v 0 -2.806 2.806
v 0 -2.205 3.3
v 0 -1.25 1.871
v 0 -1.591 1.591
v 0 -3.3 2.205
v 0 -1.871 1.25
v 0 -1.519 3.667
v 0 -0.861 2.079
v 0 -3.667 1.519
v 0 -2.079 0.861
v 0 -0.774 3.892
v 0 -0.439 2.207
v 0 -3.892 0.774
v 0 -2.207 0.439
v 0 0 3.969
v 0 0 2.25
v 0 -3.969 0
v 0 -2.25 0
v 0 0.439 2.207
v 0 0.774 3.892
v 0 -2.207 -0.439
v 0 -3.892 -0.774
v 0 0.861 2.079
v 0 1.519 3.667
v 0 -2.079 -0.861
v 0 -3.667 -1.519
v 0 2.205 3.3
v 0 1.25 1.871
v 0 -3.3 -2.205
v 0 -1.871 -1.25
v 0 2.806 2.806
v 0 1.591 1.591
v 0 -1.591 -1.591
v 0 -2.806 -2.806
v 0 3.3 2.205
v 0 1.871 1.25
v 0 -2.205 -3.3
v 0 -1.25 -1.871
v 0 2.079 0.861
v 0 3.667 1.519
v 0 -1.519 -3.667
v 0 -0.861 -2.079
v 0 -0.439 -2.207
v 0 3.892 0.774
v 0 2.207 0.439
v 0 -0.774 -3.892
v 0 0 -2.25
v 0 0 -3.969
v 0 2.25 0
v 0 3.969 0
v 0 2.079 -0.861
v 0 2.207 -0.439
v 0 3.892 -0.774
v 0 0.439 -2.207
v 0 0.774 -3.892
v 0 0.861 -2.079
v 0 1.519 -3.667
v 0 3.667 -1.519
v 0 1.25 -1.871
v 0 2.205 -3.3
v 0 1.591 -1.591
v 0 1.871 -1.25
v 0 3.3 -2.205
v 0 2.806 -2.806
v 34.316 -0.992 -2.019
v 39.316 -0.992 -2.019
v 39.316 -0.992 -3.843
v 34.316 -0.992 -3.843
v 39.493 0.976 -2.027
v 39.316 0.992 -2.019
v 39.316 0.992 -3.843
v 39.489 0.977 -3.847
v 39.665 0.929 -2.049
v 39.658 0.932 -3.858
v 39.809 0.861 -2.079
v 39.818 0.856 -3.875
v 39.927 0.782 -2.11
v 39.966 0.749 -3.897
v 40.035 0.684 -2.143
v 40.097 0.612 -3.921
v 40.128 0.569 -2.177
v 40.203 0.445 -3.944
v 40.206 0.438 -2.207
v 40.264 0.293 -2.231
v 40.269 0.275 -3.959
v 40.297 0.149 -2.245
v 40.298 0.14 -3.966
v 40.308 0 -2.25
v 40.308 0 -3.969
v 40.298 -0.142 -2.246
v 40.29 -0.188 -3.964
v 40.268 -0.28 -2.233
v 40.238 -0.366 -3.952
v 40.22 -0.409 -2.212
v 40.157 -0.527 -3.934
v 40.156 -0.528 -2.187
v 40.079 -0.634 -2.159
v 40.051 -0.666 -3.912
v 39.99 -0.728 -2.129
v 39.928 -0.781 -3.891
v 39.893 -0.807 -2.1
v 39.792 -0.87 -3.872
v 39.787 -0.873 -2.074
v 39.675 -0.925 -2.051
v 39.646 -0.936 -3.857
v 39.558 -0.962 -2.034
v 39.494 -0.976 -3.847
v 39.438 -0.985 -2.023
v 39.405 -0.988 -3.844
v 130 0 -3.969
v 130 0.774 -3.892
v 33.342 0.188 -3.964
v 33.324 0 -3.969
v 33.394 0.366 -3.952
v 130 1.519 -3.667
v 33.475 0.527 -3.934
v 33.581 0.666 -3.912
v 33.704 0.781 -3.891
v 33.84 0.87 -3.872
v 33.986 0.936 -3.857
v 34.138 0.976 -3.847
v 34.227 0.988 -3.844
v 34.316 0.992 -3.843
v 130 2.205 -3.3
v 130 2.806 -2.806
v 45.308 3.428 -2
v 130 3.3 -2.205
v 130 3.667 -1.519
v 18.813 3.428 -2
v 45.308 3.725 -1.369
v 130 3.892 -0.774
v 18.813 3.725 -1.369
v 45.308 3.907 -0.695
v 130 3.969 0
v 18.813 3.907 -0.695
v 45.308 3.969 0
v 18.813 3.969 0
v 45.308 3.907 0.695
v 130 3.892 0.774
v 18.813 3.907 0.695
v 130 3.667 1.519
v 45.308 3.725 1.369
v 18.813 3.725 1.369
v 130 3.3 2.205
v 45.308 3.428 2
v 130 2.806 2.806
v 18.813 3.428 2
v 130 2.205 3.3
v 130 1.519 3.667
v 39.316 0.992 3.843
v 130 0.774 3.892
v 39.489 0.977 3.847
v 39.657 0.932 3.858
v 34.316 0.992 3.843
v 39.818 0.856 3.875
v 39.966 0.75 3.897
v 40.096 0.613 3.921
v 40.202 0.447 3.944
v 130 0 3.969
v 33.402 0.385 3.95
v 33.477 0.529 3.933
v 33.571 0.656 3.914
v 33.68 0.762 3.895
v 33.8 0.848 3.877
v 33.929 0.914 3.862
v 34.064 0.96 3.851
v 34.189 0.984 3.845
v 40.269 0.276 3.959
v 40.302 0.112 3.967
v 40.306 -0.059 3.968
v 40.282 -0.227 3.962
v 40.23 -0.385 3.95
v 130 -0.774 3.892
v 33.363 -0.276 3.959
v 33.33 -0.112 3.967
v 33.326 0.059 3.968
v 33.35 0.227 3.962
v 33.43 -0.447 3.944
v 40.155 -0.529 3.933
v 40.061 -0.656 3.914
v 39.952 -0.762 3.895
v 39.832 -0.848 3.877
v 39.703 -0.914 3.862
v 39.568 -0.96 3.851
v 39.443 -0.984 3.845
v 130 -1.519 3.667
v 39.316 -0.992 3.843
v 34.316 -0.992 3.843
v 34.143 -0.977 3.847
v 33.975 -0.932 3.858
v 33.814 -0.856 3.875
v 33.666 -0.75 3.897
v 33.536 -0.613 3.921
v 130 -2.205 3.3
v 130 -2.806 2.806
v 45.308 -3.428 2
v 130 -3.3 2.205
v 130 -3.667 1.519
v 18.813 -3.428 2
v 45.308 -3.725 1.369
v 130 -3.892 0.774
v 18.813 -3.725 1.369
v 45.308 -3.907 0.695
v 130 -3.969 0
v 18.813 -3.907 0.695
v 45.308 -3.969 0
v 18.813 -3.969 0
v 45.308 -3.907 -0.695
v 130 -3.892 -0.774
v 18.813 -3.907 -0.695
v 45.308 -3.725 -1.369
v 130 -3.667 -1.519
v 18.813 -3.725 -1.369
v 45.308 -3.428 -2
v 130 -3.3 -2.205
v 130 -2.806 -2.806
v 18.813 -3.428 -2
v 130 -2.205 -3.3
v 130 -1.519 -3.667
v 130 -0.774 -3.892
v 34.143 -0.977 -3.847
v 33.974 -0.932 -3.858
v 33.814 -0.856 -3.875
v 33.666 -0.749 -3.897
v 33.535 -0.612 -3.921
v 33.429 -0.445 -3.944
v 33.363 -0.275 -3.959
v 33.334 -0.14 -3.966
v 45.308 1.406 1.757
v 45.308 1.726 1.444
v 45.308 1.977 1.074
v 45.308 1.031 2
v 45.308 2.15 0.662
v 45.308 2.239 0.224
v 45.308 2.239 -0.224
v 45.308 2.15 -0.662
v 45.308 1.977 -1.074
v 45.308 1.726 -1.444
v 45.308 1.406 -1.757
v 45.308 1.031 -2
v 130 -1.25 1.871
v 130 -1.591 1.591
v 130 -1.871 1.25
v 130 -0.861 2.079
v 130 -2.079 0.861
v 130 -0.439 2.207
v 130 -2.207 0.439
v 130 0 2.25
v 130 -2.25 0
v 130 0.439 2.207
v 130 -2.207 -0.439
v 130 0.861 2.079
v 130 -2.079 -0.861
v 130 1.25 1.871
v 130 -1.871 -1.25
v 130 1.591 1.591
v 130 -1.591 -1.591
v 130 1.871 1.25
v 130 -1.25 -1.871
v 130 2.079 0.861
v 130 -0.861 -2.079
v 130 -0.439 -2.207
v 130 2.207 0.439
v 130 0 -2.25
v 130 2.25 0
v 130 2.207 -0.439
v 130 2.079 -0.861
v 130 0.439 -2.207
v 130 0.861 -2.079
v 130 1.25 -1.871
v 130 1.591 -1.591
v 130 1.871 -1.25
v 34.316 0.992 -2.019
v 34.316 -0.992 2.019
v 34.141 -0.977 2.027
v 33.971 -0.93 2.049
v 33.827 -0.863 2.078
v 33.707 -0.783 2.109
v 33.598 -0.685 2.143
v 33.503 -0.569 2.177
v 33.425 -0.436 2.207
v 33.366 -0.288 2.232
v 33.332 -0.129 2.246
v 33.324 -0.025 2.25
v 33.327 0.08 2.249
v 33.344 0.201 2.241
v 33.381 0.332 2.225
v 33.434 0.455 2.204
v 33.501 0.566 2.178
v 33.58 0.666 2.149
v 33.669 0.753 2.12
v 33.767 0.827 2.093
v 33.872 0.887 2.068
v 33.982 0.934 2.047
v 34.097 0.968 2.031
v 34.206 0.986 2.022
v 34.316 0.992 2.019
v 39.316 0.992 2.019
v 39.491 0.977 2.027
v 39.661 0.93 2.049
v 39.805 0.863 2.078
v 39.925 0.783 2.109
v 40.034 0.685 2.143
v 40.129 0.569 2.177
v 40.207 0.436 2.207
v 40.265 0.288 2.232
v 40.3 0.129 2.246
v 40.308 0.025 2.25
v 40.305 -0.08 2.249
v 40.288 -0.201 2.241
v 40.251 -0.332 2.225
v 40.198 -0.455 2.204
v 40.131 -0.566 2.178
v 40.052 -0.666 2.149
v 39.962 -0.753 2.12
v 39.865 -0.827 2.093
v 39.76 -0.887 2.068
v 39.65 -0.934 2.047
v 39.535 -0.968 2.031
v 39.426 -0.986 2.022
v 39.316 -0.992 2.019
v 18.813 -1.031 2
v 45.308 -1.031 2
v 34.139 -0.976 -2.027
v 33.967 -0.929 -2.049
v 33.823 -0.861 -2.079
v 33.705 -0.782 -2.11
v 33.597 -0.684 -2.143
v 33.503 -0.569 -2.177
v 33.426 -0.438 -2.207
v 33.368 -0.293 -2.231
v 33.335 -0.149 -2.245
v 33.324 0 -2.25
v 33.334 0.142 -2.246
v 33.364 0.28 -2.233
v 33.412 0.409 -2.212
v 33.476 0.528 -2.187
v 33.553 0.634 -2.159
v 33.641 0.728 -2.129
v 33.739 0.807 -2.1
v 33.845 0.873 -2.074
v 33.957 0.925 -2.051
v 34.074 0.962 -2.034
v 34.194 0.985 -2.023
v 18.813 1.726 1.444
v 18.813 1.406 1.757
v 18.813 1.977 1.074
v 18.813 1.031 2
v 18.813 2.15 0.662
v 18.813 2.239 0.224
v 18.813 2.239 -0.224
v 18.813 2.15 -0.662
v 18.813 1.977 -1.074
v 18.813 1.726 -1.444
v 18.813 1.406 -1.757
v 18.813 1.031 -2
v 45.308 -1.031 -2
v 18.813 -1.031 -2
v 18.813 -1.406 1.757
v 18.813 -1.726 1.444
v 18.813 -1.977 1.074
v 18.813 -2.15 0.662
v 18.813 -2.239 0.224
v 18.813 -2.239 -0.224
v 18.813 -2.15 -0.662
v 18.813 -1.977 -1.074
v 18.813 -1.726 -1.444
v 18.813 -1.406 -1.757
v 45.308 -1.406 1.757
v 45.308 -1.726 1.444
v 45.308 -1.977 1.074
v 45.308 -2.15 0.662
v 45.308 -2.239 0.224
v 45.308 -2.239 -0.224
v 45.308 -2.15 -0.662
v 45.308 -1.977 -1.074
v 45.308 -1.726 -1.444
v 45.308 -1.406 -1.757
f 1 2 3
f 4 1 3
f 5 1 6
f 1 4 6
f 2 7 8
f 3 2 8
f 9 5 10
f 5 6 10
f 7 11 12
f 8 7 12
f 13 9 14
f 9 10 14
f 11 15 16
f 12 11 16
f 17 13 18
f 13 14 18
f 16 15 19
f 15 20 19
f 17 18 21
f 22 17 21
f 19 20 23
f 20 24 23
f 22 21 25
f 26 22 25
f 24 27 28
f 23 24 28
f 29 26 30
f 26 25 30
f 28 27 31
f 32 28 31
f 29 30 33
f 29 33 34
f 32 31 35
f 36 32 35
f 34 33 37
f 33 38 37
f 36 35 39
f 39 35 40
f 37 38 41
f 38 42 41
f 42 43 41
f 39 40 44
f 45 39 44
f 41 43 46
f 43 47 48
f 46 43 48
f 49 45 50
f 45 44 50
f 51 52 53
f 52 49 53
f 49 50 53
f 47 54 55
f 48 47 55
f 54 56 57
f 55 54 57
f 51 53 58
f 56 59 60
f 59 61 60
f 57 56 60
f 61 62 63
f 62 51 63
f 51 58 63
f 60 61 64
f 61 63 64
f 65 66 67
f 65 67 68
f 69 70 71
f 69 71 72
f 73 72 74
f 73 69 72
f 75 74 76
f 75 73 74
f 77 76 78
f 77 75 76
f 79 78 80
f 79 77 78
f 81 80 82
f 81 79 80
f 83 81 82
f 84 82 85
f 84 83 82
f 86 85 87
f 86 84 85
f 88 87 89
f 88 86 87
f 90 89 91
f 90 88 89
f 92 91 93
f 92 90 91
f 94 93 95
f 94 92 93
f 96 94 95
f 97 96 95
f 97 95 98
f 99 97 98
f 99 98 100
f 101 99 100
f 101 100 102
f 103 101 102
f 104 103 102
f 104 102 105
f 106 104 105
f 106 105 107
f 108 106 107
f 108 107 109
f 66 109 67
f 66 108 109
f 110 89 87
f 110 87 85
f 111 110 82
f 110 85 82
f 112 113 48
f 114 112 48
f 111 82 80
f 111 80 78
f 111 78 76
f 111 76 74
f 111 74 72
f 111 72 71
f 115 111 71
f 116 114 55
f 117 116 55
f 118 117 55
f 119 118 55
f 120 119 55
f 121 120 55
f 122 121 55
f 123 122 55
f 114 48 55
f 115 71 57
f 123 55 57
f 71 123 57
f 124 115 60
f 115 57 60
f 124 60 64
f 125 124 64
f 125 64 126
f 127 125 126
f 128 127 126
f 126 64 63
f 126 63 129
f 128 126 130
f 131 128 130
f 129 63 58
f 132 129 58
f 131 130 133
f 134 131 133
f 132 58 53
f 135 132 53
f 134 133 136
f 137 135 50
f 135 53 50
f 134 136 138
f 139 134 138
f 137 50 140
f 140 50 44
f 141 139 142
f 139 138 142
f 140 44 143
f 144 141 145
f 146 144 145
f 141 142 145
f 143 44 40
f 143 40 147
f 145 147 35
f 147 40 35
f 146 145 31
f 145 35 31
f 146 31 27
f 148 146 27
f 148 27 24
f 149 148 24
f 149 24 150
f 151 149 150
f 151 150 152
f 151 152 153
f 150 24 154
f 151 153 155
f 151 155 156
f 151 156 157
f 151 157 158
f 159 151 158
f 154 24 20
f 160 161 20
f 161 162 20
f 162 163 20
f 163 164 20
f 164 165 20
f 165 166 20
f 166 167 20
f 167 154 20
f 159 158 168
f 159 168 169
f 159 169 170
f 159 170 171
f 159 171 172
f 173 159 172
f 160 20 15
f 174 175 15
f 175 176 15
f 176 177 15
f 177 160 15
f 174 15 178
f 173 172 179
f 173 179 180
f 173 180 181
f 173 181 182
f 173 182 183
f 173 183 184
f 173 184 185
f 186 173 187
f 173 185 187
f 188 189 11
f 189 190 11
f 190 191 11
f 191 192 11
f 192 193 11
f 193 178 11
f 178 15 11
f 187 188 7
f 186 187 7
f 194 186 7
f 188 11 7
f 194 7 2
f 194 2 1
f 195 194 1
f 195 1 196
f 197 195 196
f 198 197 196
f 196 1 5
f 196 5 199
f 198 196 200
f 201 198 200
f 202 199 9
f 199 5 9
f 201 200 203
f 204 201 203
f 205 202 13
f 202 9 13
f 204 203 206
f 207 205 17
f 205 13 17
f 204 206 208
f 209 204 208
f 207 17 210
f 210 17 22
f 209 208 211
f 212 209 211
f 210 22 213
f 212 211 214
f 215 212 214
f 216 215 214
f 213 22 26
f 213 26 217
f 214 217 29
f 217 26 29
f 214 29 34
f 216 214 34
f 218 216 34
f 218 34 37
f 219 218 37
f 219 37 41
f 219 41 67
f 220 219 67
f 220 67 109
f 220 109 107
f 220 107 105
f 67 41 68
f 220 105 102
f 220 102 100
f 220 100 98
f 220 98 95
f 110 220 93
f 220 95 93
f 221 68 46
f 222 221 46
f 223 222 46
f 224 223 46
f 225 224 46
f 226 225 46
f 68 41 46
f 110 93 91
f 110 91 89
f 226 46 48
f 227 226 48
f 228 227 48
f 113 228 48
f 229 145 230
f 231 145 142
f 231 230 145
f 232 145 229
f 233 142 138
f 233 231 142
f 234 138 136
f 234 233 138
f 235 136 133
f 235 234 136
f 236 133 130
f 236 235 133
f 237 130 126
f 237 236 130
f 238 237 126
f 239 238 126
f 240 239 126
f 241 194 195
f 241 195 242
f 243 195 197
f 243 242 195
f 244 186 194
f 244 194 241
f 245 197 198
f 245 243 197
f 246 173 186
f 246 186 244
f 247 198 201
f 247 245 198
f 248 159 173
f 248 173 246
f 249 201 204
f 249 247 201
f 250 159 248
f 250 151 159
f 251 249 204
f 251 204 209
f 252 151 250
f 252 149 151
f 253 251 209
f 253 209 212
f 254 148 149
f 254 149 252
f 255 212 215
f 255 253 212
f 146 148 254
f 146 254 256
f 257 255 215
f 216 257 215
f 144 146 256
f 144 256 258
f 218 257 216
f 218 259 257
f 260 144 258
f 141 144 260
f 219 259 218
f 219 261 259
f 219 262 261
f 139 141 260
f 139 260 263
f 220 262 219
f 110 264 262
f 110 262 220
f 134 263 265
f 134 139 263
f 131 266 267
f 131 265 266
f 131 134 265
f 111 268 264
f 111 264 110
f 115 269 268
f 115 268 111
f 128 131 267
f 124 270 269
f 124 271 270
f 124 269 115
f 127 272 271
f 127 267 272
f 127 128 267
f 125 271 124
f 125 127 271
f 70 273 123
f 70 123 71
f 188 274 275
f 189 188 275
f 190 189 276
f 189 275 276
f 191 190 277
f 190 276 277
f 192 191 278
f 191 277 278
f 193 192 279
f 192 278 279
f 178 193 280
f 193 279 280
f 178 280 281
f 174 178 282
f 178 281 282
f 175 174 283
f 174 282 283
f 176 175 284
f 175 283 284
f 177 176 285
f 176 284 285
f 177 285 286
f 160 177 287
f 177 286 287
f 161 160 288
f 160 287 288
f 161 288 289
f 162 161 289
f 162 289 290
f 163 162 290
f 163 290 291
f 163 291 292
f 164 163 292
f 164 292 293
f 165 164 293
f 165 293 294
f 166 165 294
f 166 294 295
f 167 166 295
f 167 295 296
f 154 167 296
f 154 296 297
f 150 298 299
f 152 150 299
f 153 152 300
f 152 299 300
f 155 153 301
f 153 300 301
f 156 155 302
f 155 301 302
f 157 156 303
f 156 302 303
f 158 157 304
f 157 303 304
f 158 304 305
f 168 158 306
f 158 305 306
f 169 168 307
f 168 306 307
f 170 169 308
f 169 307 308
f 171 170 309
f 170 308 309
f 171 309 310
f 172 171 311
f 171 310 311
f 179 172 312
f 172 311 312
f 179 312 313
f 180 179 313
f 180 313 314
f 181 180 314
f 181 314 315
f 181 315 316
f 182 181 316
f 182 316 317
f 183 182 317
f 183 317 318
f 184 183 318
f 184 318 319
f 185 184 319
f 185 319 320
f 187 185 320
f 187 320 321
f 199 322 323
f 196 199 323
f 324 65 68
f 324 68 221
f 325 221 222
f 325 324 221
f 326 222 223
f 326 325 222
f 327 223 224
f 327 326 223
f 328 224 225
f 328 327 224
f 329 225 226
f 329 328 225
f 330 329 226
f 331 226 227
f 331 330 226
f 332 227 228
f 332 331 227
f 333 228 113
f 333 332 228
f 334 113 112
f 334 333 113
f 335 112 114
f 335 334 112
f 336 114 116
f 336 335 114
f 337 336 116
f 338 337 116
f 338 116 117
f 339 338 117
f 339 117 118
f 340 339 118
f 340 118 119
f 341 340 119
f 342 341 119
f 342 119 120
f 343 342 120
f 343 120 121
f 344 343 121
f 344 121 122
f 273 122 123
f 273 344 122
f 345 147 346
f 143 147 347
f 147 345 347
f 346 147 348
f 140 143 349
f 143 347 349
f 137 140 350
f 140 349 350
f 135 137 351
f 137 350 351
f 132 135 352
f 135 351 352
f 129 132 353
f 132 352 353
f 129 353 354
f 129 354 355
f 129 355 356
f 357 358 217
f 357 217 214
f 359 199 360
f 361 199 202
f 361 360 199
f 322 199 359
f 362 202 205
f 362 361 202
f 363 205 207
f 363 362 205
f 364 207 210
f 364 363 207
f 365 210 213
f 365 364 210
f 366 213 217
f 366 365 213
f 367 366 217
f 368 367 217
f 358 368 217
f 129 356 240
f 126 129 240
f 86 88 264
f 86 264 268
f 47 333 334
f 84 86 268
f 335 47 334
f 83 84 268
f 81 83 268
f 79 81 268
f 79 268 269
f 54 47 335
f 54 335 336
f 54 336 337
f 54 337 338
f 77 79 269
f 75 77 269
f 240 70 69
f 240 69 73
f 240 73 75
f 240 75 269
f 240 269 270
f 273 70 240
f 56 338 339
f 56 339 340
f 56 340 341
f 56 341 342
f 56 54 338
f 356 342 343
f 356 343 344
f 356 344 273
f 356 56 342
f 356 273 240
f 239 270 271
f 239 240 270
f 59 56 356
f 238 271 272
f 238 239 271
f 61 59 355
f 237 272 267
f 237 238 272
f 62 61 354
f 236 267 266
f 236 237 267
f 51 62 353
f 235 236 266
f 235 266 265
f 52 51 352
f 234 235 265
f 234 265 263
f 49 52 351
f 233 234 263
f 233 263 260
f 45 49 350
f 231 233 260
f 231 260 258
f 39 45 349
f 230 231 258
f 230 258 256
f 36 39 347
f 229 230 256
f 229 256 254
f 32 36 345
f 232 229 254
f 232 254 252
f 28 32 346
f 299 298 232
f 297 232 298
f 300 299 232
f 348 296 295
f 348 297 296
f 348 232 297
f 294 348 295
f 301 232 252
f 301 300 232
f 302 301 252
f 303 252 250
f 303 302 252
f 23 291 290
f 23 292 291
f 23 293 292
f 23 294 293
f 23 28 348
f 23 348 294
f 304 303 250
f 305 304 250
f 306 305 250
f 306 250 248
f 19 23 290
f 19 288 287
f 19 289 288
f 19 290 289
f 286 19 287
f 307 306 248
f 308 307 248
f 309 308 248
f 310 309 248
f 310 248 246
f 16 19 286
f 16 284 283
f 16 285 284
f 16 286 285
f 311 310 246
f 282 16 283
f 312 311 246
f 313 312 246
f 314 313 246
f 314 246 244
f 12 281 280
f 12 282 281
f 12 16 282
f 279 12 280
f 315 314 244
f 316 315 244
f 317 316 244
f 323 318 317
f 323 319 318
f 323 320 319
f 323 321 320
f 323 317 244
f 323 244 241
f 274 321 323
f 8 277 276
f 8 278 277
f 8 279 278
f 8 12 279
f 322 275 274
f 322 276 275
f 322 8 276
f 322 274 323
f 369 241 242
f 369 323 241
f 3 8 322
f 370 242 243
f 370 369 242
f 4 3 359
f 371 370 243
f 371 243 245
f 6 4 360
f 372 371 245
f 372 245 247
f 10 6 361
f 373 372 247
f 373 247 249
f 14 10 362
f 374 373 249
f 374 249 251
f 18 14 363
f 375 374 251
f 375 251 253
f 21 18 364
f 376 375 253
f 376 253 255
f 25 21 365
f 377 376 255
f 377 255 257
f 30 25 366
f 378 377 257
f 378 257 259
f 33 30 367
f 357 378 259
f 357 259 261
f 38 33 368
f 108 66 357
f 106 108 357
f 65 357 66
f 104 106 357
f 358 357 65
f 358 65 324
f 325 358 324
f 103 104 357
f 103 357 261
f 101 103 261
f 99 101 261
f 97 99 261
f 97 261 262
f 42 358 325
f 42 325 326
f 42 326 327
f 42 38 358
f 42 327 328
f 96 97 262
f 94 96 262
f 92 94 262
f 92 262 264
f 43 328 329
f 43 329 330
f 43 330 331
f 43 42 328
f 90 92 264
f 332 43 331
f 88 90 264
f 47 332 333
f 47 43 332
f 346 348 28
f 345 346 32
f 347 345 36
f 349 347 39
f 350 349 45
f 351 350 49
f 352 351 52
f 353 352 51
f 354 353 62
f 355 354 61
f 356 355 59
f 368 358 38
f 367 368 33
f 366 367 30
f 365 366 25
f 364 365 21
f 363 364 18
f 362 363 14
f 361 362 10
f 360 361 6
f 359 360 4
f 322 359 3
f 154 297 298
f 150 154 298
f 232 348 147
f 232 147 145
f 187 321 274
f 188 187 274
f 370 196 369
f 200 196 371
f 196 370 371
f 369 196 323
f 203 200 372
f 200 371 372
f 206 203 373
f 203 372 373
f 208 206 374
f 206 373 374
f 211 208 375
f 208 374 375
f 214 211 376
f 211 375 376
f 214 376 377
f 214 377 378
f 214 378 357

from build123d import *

# Parameters (mm, degrees)
SKETCH2_R                                          = 3.96875
SKETCH2_R_2                                        = 2.25
BODY_DEPTH                                         = 130
CAVITY_FOR_SLIDER_DEPTH                            = 131.121104949
CAVITY_FOR_SLIDER_DEPTH_BACK                       = 131.121104949
SKETCH4_W                                          = 26.495455659
SKETCH4_H                                          = 4
SLIDER_TRACK_FOR_M2_SCREW_5_64_END_MILL_DEPTH      = 131.121104949
SLIDER_TRACK_FOR_M2_SCREW_5_64_END_MILL_DEPTH_BACK = 131.121104949


with BuildPart() as part:
    # Sketch2 → Body (new body)
    with BuildSketch(Plane(origin=(0, 0, 0), x_dir=(0, 0, -1), z_dir=(1, 0, 0))):
        Circle(SKETCH2_R)
        Circle(SKETCH2_R_2, mode=Mode.SUBTRACT)
    extrude(amount=BODY_DEPTH)

    # Sketch4 → cavity for slider (cut, two sides: drawn at the far end of the back side and taken through both)
    with BuildSketch(Plane(origin=(0, 0, 0), x_dir=(1, 0, 0), z_dir=(0, 1, 0)).offset(-CAVITY_FOR_SLIDER_DEPTH_BACK)):
        with Locations((32.060413051, 0)):
            Rectangle(SKETCH4_W, SKETCH4_H)
    extrude(amount=CAVITY_FOR_SLIDER_DEPTH + CAVITY_FOR_SLIDER_DEPTH_BACK, mode=Mode.SUBTRACT)

    # Sketch12 → slider track for M2 screw 5/64 end mill (cut, two sides: drawn at the far end of the back side and taken through both)
    with BuildSketch(Plane.XY.offset(-SLIDER_TRACK_FOR_M2_SCREW_5_64_END_MILL_DEPTH_BACK)):
        with BuildLine():
            Line((39.315953381, -0.9921875), (34.315953381, -0.9921875))
            ThreePointArc((34.315953381, -0.9921875), (33.323765881, 0), (34.315953381, 0.9921875))
            Line((34.315953381, 0.9921875), (39.315953381, 0.9921875))
            ThreePointArc((39.315953381, 0.9921875), (40.308140881, 0), (39.315953381, -0.9921875))
        make_face()
    extrude(amount=SLIDER_TRACK_FOR_M2_SCREW_5_64_END_MILL_DEPTH + SLIDER_TRACK_FOR_M2_SCREW_5_64_END_MILL_DEPTH_BACK, mode=Mode.SUBTRACT)


solid = part.part
